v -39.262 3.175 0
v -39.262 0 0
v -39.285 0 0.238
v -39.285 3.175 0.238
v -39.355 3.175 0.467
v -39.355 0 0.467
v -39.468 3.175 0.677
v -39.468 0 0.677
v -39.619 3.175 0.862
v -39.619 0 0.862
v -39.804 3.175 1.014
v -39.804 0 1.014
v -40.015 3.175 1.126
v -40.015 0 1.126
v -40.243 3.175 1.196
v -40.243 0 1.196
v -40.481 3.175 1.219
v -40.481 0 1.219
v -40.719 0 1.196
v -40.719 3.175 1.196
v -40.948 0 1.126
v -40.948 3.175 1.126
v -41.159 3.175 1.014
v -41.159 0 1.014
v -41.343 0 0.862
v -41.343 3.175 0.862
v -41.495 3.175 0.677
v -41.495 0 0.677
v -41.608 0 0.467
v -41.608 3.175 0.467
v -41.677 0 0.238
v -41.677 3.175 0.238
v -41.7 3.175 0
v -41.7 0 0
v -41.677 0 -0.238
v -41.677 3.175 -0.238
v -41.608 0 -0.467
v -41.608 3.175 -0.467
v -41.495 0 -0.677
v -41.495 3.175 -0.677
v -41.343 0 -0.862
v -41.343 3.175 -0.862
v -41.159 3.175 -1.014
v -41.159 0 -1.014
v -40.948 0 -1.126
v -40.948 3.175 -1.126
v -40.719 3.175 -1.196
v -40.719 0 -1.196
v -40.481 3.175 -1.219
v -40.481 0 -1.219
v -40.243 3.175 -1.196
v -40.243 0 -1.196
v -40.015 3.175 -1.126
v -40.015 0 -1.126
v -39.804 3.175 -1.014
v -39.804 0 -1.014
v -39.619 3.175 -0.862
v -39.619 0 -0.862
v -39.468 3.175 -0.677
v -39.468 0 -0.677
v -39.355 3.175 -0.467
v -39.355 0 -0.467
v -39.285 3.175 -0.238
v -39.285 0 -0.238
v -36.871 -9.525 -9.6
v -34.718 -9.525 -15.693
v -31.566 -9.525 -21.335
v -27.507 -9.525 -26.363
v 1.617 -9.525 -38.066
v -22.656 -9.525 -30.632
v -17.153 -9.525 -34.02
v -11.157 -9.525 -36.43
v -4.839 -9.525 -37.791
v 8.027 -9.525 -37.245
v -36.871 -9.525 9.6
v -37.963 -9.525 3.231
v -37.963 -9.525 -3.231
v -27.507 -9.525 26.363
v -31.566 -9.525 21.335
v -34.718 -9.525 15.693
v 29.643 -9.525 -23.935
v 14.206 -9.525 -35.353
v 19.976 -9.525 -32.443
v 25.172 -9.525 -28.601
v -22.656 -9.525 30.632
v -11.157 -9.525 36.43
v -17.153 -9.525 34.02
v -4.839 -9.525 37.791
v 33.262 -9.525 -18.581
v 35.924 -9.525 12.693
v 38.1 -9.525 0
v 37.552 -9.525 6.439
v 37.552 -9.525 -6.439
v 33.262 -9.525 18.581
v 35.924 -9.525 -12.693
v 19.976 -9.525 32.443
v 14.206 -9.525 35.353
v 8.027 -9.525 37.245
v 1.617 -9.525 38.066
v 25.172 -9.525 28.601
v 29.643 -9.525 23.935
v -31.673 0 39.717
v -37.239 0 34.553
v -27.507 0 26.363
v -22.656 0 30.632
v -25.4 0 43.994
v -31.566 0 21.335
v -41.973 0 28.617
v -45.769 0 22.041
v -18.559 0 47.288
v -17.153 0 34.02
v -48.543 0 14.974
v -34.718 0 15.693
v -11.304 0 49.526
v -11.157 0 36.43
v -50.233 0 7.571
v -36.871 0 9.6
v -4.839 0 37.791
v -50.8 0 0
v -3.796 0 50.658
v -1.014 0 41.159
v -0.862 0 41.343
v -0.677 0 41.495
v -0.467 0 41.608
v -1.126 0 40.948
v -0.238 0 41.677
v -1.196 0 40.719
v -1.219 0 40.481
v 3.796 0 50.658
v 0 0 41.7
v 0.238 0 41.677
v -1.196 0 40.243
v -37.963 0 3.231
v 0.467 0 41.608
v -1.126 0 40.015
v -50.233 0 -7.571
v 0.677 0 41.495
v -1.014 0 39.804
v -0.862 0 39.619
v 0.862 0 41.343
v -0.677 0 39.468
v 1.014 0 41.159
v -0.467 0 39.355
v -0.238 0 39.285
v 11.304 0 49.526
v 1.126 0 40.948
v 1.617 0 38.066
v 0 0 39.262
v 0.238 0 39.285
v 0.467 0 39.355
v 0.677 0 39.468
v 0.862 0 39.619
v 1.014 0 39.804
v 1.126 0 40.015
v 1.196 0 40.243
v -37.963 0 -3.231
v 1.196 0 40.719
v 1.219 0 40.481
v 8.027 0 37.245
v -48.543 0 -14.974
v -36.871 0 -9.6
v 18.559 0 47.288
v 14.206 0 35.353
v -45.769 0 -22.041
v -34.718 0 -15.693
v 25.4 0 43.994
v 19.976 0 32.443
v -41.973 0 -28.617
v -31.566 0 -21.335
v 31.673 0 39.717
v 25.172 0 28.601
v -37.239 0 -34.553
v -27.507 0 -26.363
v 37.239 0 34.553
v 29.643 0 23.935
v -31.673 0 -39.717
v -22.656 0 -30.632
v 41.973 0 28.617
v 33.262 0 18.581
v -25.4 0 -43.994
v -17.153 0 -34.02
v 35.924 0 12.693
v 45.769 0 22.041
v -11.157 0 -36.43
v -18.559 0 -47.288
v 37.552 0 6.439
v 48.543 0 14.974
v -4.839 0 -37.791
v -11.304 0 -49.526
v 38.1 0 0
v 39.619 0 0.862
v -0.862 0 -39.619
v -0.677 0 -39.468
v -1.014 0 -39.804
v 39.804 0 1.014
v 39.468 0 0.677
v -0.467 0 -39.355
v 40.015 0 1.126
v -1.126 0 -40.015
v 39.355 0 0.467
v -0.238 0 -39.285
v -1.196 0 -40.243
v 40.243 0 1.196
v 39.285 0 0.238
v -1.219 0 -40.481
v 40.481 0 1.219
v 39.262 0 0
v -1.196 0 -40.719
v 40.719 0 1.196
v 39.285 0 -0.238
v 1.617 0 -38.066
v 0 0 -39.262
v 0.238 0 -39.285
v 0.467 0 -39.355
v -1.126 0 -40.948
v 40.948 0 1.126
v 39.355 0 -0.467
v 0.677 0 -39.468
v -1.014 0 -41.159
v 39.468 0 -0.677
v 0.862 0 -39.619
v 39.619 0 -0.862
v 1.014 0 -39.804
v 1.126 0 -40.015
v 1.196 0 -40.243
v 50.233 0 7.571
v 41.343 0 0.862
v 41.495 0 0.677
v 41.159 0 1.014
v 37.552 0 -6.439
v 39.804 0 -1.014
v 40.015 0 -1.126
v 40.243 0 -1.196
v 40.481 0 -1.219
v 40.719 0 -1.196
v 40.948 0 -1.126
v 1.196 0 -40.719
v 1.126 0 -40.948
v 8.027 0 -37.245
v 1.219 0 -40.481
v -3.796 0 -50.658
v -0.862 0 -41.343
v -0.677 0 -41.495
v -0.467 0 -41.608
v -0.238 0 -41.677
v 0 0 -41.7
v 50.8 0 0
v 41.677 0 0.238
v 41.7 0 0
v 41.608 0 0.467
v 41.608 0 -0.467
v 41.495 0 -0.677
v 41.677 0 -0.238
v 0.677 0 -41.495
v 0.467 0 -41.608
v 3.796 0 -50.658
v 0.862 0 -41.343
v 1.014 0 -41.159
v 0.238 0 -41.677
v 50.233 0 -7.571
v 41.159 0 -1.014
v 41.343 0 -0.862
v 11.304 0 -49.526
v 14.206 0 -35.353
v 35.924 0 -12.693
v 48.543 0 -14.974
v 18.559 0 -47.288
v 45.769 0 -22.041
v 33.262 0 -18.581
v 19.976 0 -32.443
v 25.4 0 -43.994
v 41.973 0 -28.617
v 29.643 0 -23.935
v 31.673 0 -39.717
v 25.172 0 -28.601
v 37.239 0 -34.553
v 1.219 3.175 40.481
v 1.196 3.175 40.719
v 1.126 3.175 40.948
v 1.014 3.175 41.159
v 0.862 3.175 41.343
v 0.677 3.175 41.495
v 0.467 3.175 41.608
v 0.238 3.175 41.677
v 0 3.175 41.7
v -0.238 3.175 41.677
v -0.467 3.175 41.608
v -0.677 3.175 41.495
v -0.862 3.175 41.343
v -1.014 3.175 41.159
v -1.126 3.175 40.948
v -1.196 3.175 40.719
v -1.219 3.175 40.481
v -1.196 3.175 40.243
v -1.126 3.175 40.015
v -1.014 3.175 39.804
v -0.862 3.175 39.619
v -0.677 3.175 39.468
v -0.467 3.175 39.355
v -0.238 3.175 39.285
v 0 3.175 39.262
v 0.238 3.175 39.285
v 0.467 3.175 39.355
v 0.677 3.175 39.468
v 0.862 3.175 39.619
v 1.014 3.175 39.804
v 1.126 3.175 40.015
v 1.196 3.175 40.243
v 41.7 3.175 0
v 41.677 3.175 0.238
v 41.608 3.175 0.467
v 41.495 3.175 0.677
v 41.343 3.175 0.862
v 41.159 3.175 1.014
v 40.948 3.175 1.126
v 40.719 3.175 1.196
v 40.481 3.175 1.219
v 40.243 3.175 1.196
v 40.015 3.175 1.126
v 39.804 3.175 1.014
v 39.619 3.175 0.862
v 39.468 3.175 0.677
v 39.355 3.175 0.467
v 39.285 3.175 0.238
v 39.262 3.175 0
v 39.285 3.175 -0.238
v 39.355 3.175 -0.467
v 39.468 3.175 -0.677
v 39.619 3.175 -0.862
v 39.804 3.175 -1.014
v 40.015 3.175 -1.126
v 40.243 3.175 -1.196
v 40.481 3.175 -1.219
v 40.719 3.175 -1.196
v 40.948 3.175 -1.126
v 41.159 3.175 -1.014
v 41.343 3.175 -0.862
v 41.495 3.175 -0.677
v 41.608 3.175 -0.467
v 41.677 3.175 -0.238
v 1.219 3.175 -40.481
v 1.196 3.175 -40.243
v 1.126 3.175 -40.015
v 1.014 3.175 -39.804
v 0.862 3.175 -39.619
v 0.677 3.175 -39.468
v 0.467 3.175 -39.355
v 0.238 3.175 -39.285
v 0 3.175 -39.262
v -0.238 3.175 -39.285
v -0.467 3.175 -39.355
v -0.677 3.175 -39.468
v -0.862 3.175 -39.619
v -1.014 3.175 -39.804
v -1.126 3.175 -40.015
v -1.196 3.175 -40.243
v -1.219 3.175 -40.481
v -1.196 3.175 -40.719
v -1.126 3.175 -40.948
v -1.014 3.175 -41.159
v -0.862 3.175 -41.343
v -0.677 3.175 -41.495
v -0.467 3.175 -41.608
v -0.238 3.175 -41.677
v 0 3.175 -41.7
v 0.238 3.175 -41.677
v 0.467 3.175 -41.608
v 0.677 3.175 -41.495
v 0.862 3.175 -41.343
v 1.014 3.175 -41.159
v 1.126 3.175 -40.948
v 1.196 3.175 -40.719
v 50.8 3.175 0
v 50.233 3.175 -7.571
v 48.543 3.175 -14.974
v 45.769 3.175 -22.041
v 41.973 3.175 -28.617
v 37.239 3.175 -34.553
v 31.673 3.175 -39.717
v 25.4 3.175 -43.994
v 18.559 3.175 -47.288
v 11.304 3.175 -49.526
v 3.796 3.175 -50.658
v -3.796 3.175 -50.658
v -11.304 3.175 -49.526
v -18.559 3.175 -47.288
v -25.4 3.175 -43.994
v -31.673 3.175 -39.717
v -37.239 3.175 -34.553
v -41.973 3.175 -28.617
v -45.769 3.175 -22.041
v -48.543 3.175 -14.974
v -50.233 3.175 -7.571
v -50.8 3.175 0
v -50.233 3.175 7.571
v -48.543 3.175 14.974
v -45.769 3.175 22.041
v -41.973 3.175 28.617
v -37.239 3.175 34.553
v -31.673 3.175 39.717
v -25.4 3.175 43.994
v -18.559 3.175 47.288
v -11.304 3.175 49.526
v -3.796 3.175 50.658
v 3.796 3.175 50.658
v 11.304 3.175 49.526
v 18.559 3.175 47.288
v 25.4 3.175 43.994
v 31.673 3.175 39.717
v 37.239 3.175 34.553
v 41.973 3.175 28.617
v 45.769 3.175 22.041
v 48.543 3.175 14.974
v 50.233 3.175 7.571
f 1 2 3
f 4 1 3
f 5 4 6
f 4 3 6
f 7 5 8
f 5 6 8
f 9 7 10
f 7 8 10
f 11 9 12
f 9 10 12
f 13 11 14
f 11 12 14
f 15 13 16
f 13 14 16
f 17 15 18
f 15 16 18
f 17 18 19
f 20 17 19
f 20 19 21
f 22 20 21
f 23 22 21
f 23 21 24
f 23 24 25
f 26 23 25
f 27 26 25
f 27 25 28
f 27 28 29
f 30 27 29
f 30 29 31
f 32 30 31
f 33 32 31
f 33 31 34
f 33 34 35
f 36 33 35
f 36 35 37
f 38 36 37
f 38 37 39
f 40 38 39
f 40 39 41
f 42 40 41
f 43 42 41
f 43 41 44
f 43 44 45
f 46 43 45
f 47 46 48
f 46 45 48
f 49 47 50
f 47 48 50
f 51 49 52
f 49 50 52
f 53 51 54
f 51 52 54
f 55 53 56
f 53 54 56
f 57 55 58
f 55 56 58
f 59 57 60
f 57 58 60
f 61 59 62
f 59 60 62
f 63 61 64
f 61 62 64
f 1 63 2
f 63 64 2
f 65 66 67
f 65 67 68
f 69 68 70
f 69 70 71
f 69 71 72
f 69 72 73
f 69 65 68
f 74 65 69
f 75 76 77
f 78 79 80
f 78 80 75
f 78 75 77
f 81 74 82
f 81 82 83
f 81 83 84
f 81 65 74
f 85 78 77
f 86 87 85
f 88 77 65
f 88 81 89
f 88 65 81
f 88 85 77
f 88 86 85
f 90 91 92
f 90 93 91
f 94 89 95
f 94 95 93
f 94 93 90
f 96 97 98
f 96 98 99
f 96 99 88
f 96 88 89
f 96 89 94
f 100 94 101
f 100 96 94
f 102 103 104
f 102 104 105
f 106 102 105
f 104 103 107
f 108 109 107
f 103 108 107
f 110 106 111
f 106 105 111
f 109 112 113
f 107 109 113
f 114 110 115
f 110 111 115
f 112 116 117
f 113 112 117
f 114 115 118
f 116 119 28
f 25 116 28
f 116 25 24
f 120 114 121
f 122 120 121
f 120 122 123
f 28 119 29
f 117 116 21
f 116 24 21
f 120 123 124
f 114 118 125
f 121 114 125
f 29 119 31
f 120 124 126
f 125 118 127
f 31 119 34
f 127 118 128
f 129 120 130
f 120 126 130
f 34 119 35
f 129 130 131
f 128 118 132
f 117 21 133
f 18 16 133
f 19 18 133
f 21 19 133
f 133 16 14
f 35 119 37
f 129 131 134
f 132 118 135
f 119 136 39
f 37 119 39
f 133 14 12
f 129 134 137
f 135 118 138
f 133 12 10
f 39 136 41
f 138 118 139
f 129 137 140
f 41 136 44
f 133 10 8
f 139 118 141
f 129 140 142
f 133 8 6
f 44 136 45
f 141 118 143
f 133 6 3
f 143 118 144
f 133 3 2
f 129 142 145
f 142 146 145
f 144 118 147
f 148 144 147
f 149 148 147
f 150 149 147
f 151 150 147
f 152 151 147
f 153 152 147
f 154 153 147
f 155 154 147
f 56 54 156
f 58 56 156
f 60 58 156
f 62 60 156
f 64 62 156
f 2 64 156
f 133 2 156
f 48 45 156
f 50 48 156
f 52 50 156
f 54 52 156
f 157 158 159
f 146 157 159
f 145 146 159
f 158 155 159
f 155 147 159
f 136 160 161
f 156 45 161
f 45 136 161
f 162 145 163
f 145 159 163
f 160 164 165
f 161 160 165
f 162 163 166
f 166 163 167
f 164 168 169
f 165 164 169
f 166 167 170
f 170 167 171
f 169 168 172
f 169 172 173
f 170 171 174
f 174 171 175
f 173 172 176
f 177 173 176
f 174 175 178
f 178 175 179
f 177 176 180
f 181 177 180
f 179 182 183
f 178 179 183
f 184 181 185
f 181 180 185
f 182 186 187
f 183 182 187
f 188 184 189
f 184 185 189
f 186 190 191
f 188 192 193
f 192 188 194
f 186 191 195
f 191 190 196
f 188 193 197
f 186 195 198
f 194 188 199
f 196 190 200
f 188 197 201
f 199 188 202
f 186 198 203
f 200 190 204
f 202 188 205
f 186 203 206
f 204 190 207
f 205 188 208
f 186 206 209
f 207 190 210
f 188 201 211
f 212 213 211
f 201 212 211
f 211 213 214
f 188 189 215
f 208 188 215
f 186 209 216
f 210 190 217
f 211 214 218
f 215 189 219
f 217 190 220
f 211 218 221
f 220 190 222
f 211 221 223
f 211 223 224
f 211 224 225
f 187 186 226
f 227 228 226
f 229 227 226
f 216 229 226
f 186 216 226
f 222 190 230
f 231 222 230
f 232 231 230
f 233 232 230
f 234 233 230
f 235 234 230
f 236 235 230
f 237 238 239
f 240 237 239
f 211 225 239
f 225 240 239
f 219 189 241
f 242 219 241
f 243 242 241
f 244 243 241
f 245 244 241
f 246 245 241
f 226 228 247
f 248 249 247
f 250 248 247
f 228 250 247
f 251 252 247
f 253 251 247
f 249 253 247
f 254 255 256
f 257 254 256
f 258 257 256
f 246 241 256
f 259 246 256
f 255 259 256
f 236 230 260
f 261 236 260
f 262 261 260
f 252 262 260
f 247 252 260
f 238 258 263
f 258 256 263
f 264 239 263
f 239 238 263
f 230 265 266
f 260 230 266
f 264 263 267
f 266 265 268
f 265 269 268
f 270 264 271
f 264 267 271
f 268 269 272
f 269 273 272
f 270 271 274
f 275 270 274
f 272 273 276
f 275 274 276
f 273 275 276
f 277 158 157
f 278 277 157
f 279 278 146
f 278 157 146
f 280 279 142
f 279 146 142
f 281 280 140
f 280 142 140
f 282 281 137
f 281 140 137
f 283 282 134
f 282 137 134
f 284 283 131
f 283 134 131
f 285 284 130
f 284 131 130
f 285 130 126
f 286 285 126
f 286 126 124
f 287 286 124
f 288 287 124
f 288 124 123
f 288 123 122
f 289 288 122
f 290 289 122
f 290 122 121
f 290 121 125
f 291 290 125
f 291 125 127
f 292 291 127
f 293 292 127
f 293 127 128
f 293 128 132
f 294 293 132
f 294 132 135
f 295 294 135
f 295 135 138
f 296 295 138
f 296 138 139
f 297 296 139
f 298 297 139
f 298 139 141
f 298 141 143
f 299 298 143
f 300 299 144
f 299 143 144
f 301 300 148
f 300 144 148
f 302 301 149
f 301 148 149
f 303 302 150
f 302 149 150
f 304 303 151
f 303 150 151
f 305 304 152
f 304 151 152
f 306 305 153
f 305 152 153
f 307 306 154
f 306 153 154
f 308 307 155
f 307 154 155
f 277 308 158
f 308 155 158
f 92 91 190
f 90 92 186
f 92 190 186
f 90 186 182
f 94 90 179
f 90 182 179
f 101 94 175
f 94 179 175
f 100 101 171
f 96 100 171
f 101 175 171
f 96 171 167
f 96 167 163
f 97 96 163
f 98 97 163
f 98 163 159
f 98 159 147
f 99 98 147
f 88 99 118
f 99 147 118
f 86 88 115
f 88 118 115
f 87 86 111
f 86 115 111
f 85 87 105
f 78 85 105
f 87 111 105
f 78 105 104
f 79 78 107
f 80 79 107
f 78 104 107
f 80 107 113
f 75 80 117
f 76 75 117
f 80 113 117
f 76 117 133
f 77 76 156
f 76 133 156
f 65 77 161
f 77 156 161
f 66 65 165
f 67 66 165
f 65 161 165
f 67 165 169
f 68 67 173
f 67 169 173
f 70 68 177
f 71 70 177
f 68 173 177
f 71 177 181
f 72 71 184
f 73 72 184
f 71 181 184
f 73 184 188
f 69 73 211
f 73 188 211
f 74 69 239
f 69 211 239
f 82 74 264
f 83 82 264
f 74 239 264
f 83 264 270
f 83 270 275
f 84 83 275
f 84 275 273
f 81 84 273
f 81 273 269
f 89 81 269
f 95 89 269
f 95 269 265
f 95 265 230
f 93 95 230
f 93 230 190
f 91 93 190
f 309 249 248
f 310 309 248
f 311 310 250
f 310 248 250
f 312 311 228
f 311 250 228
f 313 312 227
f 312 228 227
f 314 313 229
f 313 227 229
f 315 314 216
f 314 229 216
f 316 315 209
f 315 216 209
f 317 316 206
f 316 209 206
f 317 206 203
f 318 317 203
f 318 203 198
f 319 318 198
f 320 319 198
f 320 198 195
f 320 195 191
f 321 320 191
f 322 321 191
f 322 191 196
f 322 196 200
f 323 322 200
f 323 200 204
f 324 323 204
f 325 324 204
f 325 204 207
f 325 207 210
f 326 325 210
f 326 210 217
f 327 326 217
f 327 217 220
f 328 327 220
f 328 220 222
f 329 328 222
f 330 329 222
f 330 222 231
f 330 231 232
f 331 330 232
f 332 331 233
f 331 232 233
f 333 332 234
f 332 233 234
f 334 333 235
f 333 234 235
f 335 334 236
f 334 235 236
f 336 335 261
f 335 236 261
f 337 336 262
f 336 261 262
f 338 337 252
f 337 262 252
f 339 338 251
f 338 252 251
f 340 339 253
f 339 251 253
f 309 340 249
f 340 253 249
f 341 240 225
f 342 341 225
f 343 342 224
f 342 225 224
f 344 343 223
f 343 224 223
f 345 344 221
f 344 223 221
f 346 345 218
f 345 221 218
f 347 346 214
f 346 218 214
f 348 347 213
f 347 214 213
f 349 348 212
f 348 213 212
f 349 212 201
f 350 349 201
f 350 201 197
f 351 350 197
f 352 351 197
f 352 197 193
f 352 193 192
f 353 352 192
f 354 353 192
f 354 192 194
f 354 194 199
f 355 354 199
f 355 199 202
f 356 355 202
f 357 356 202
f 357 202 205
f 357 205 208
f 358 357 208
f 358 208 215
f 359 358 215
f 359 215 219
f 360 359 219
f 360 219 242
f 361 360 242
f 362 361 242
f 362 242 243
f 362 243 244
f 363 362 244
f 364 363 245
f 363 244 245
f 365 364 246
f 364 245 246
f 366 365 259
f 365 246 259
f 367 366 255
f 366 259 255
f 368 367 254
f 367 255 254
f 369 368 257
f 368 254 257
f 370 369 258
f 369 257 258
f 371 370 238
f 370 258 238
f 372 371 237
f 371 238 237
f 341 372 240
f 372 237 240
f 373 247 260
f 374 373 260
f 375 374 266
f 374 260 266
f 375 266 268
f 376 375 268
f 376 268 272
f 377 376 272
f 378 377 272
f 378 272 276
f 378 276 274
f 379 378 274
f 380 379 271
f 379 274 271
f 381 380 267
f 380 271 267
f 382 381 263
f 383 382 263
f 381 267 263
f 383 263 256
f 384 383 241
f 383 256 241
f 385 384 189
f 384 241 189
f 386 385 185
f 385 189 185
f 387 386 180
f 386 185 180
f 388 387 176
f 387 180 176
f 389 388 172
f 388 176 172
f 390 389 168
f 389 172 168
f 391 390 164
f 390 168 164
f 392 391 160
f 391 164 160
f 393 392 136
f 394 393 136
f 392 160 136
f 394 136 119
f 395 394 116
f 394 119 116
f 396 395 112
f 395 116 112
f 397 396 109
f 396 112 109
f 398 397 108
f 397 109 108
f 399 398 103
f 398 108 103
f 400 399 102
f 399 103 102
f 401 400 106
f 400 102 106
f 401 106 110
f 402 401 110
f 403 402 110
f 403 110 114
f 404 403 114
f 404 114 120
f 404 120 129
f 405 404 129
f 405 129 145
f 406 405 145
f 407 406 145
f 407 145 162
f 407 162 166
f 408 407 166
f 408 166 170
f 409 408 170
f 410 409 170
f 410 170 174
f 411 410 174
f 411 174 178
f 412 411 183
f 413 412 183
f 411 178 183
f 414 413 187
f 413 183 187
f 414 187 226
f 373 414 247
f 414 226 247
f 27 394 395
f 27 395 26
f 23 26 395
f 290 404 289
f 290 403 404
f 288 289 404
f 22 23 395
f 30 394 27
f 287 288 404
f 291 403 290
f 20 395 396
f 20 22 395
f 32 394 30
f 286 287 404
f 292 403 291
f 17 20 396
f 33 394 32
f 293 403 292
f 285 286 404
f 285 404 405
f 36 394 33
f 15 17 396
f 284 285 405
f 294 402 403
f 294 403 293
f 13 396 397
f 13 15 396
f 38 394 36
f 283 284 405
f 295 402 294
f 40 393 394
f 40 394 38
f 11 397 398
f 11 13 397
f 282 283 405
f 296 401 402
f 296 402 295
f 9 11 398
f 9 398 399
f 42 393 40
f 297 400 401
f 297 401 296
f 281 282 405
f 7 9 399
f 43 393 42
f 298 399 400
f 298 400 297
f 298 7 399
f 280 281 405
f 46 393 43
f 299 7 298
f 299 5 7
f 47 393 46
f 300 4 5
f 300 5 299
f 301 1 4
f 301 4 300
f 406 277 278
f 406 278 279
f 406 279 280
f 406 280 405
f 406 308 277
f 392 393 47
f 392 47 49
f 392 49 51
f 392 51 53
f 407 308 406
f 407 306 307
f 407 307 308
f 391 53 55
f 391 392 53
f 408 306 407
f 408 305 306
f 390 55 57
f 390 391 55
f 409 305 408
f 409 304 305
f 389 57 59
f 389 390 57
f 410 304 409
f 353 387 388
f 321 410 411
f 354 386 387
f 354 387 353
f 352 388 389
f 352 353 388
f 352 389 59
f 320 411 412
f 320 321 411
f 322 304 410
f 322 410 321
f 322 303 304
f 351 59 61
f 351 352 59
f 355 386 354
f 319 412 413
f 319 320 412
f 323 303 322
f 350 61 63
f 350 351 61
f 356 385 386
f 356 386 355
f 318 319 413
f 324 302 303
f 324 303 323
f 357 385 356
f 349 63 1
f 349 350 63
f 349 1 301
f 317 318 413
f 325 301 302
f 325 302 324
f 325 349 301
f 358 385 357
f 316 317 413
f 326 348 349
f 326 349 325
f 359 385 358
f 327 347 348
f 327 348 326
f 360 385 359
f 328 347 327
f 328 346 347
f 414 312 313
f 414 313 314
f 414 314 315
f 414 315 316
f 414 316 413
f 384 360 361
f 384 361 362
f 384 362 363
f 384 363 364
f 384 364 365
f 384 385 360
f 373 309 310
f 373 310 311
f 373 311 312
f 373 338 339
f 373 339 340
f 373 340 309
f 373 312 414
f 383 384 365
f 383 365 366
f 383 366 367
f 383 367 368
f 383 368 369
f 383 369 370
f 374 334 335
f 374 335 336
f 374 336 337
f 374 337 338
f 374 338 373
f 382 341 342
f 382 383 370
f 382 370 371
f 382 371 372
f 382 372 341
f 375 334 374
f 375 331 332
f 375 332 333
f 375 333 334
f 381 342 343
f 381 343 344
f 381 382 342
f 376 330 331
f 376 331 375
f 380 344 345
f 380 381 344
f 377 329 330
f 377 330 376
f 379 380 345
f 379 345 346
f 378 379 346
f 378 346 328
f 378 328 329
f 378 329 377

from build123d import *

# Parameters (mm, degrees)
SKETCH1_R                 = 50.8
BOSS_EXTRUDE1_DEPTH       = 3.175
SKETCH2_R                 = 38.1
BOSS_EXTRUDE2_DEPTH       = 9.525
F_2_CLEARANCE_HOLE1_D     = 2.4384
F_2_CLEARANCE_HOLE1_DEPTH = 25.4
F_2_CLEARANCE_HOLE1_TIP   = 0.732569267


with BuildPart() as part:
    # Sketch1 → Boss-Extrude1 (new body)
    with BuildSketch(Plane(origin=(0, 0, 0), x_dir=(1, 0, 0), z_dir=(0, 1, 0))):
        Circle(SKETCH1_R)
    extrude(amount=BOSS_EXTRUDE1_DEPTH)

    # Sketch2 → Boss-Extrude2 (add)
    with BuildSketch(Plane.XZ):
        Circle(SKETCH2_R)
    extrude(amount=BOSS_EXTRUDE2_DEPTH)

    # #2 Clearance Hole1
    with Locations(Plane(origin=(0, 3.175, 0), x_dir=(-1, 0, 0), z_dir=(0, 1, 0))):
        with Locations((0, -40.48125), (-40.48125, 0), (40.48125, 0), (0, 40.48125)):
            Hole(F_2_CLEARANCE_HOLE1_D / 2, depth=F_2_CLEARANCE_HOLE1_DEPTH)
            with Locations((0, 0, -(F_2_CLEARANCE_HOLE1_DEPTH + F_2_CLEARANCE_HOLE1_TIP / 2))):  # 118° drill point
                Cone(0, F_2_CLEARANCE_HOLE1_D / 2, F_2_CLEARANCE_HOLE1_TIP, mode=Mode.SUBTRACT)


solid = part.part
